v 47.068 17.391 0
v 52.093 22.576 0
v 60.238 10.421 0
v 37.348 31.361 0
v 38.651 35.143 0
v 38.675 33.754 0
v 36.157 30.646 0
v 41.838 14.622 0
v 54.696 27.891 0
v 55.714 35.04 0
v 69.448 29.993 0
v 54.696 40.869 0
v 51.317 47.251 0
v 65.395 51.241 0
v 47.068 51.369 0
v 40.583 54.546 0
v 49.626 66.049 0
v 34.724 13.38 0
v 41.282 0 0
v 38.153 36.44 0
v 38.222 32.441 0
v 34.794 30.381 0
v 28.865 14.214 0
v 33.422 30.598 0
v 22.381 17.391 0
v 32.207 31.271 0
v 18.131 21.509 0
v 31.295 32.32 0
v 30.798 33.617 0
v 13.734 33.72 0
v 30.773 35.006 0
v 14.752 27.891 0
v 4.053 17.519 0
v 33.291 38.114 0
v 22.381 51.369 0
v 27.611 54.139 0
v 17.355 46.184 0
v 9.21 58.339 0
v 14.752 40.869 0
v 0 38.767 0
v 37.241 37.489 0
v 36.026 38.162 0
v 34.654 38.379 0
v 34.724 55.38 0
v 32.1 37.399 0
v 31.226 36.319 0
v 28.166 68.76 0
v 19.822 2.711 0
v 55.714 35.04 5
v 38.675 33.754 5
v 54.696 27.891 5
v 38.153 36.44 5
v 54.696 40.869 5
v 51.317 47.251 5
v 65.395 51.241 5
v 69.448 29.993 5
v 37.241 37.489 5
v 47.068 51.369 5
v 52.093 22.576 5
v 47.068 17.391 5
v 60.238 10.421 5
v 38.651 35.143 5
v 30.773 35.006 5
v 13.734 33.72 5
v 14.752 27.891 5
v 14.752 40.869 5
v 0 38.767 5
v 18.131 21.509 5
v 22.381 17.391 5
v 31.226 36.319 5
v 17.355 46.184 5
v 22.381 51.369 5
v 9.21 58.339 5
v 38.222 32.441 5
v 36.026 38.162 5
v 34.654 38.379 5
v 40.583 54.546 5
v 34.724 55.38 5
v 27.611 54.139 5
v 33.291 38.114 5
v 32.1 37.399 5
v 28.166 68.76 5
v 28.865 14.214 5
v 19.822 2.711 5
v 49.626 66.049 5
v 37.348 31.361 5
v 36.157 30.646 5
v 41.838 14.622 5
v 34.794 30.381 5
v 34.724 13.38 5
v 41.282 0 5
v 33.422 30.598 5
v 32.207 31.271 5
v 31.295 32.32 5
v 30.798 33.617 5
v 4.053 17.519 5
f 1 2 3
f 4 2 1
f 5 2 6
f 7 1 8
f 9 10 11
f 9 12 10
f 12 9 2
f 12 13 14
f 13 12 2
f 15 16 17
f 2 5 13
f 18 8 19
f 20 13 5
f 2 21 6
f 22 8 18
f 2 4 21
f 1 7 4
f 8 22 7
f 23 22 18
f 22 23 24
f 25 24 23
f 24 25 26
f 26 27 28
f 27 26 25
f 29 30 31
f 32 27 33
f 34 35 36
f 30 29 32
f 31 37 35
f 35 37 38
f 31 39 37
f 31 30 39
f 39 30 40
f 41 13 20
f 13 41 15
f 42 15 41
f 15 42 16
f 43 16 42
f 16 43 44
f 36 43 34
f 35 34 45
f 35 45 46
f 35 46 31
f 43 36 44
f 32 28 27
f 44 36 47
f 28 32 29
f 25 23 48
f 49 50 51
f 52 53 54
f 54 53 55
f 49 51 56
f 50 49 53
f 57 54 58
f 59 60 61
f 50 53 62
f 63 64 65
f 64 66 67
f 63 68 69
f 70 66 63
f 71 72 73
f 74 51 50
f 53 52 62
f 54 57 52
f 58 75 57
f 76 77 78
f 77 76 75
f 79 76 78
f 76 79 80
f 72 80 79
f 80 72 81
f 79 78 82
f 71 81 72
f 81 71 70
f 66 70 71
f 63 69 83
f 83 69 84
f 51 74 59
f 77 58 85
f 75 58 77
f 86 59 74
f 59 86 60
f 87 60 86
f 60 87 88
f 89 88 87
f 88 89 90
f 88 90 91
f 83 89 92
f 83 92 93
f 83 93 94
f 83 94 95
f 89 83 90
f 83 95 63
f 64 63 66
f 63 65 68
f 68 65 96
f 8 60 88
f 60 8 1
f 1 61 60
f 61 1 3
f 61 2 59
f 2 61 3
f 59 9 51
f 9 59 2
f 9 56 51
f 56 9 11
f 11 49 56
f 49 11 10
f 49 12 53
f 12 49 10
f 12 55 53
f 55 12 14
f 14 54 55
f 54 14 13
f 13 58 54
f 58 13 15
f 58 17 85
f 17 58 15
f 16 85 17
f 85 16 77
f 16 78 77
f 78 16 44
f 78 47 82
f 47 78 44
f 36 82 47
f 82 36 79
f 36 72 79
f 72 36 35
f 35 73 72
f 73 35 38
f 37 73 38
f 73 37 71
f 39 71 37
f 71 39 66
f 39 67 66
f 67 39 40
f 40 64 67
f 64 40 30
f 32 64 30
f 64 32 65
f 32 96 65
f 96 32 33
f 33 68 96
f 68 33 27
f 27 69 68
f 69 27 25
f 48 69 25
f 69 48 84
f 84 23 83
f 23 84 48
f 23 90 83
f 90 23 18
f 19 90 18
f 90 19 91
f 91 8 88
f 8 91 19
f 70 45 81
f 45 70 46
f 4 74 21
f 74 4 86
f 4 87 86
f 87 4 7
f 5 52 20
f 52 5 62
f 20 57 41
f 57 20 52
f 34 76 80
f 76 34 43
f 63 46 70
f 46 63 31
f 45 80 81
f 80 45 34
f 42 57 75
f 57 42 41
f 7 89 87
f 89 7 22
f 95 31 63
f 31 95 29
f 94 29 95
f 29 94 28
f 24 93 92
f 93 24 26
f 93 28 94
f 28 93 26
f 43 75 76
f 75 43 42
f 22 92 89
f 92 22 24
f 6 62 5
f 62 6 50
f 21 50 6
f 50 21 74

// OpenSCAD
$fn = 32;

// ----------------------------------------------------------------------
// Star wheel: 10-point ratchet, R35
// ----------------------------------------------------------------------

// --- parameters (mm) ---
n_points = 10;            // number of points / teeth
r_out = 35;               // tip radius
r_in = 21;                // root radius
bore_r = 4;               // centre bore radius
plate_t = 5;              // plate thickness, Z (extrusion height)
bore_d = 8;               // centre bore diameter

profile = [[34.724, 55.38], [28.166, 68.76], [27.611, 54.139], [22.381, 51.369], [9.21, 58.339], [17.355, 46.184], [14.752, 40.869], [0, 38.767], [13.734, 33.72], [14.752, 27.891], [4.053, 17.519], [18.131, 21.509], [22.381, 17.391], [19.822, 2.711], [28.865, 14.214], [34.724, 13.38], [41.282, 0], [41.838, 14.622], [47.068, 17.391], [60.238, 10.421], [52.093, 22.576], [54.696, 27.891], [69.448, 29.993], [55.714, 35.04], [54.696, 40.869], [65.395, 51.241], [51.317, 47.251], [47.068, 51.369], [49.626, 66.049], [40.583, 54.546]];  // primary outline, 30 points, counter clockwise
void_1 = [[38.651, 35.143], [38.153, 36.44], [37.241, 37.489], [36.026, 38.162], [34.654, 38.379], [33.291, 38.114], [32.1, 37.399], [31.226, 36.319], [30.773, 35.006], [30.798, 33.617], [31.295, 32.32], [32.207, 31.271], [33.422, 30.598], [34.794, 30.381], [36.157, 30.646], [37.348, 31.361], [38.222, 32.441], [38.675, 33.754]];  // centre bore, 18 points

// --- the one profile operation ---
difference() {
  linear_extrude(height = plate_t) polygon(points = profile);
  translate([0, 0, -1])
    linear_extrude(height = plate_t + 2) polygon(points = void_1);
}
